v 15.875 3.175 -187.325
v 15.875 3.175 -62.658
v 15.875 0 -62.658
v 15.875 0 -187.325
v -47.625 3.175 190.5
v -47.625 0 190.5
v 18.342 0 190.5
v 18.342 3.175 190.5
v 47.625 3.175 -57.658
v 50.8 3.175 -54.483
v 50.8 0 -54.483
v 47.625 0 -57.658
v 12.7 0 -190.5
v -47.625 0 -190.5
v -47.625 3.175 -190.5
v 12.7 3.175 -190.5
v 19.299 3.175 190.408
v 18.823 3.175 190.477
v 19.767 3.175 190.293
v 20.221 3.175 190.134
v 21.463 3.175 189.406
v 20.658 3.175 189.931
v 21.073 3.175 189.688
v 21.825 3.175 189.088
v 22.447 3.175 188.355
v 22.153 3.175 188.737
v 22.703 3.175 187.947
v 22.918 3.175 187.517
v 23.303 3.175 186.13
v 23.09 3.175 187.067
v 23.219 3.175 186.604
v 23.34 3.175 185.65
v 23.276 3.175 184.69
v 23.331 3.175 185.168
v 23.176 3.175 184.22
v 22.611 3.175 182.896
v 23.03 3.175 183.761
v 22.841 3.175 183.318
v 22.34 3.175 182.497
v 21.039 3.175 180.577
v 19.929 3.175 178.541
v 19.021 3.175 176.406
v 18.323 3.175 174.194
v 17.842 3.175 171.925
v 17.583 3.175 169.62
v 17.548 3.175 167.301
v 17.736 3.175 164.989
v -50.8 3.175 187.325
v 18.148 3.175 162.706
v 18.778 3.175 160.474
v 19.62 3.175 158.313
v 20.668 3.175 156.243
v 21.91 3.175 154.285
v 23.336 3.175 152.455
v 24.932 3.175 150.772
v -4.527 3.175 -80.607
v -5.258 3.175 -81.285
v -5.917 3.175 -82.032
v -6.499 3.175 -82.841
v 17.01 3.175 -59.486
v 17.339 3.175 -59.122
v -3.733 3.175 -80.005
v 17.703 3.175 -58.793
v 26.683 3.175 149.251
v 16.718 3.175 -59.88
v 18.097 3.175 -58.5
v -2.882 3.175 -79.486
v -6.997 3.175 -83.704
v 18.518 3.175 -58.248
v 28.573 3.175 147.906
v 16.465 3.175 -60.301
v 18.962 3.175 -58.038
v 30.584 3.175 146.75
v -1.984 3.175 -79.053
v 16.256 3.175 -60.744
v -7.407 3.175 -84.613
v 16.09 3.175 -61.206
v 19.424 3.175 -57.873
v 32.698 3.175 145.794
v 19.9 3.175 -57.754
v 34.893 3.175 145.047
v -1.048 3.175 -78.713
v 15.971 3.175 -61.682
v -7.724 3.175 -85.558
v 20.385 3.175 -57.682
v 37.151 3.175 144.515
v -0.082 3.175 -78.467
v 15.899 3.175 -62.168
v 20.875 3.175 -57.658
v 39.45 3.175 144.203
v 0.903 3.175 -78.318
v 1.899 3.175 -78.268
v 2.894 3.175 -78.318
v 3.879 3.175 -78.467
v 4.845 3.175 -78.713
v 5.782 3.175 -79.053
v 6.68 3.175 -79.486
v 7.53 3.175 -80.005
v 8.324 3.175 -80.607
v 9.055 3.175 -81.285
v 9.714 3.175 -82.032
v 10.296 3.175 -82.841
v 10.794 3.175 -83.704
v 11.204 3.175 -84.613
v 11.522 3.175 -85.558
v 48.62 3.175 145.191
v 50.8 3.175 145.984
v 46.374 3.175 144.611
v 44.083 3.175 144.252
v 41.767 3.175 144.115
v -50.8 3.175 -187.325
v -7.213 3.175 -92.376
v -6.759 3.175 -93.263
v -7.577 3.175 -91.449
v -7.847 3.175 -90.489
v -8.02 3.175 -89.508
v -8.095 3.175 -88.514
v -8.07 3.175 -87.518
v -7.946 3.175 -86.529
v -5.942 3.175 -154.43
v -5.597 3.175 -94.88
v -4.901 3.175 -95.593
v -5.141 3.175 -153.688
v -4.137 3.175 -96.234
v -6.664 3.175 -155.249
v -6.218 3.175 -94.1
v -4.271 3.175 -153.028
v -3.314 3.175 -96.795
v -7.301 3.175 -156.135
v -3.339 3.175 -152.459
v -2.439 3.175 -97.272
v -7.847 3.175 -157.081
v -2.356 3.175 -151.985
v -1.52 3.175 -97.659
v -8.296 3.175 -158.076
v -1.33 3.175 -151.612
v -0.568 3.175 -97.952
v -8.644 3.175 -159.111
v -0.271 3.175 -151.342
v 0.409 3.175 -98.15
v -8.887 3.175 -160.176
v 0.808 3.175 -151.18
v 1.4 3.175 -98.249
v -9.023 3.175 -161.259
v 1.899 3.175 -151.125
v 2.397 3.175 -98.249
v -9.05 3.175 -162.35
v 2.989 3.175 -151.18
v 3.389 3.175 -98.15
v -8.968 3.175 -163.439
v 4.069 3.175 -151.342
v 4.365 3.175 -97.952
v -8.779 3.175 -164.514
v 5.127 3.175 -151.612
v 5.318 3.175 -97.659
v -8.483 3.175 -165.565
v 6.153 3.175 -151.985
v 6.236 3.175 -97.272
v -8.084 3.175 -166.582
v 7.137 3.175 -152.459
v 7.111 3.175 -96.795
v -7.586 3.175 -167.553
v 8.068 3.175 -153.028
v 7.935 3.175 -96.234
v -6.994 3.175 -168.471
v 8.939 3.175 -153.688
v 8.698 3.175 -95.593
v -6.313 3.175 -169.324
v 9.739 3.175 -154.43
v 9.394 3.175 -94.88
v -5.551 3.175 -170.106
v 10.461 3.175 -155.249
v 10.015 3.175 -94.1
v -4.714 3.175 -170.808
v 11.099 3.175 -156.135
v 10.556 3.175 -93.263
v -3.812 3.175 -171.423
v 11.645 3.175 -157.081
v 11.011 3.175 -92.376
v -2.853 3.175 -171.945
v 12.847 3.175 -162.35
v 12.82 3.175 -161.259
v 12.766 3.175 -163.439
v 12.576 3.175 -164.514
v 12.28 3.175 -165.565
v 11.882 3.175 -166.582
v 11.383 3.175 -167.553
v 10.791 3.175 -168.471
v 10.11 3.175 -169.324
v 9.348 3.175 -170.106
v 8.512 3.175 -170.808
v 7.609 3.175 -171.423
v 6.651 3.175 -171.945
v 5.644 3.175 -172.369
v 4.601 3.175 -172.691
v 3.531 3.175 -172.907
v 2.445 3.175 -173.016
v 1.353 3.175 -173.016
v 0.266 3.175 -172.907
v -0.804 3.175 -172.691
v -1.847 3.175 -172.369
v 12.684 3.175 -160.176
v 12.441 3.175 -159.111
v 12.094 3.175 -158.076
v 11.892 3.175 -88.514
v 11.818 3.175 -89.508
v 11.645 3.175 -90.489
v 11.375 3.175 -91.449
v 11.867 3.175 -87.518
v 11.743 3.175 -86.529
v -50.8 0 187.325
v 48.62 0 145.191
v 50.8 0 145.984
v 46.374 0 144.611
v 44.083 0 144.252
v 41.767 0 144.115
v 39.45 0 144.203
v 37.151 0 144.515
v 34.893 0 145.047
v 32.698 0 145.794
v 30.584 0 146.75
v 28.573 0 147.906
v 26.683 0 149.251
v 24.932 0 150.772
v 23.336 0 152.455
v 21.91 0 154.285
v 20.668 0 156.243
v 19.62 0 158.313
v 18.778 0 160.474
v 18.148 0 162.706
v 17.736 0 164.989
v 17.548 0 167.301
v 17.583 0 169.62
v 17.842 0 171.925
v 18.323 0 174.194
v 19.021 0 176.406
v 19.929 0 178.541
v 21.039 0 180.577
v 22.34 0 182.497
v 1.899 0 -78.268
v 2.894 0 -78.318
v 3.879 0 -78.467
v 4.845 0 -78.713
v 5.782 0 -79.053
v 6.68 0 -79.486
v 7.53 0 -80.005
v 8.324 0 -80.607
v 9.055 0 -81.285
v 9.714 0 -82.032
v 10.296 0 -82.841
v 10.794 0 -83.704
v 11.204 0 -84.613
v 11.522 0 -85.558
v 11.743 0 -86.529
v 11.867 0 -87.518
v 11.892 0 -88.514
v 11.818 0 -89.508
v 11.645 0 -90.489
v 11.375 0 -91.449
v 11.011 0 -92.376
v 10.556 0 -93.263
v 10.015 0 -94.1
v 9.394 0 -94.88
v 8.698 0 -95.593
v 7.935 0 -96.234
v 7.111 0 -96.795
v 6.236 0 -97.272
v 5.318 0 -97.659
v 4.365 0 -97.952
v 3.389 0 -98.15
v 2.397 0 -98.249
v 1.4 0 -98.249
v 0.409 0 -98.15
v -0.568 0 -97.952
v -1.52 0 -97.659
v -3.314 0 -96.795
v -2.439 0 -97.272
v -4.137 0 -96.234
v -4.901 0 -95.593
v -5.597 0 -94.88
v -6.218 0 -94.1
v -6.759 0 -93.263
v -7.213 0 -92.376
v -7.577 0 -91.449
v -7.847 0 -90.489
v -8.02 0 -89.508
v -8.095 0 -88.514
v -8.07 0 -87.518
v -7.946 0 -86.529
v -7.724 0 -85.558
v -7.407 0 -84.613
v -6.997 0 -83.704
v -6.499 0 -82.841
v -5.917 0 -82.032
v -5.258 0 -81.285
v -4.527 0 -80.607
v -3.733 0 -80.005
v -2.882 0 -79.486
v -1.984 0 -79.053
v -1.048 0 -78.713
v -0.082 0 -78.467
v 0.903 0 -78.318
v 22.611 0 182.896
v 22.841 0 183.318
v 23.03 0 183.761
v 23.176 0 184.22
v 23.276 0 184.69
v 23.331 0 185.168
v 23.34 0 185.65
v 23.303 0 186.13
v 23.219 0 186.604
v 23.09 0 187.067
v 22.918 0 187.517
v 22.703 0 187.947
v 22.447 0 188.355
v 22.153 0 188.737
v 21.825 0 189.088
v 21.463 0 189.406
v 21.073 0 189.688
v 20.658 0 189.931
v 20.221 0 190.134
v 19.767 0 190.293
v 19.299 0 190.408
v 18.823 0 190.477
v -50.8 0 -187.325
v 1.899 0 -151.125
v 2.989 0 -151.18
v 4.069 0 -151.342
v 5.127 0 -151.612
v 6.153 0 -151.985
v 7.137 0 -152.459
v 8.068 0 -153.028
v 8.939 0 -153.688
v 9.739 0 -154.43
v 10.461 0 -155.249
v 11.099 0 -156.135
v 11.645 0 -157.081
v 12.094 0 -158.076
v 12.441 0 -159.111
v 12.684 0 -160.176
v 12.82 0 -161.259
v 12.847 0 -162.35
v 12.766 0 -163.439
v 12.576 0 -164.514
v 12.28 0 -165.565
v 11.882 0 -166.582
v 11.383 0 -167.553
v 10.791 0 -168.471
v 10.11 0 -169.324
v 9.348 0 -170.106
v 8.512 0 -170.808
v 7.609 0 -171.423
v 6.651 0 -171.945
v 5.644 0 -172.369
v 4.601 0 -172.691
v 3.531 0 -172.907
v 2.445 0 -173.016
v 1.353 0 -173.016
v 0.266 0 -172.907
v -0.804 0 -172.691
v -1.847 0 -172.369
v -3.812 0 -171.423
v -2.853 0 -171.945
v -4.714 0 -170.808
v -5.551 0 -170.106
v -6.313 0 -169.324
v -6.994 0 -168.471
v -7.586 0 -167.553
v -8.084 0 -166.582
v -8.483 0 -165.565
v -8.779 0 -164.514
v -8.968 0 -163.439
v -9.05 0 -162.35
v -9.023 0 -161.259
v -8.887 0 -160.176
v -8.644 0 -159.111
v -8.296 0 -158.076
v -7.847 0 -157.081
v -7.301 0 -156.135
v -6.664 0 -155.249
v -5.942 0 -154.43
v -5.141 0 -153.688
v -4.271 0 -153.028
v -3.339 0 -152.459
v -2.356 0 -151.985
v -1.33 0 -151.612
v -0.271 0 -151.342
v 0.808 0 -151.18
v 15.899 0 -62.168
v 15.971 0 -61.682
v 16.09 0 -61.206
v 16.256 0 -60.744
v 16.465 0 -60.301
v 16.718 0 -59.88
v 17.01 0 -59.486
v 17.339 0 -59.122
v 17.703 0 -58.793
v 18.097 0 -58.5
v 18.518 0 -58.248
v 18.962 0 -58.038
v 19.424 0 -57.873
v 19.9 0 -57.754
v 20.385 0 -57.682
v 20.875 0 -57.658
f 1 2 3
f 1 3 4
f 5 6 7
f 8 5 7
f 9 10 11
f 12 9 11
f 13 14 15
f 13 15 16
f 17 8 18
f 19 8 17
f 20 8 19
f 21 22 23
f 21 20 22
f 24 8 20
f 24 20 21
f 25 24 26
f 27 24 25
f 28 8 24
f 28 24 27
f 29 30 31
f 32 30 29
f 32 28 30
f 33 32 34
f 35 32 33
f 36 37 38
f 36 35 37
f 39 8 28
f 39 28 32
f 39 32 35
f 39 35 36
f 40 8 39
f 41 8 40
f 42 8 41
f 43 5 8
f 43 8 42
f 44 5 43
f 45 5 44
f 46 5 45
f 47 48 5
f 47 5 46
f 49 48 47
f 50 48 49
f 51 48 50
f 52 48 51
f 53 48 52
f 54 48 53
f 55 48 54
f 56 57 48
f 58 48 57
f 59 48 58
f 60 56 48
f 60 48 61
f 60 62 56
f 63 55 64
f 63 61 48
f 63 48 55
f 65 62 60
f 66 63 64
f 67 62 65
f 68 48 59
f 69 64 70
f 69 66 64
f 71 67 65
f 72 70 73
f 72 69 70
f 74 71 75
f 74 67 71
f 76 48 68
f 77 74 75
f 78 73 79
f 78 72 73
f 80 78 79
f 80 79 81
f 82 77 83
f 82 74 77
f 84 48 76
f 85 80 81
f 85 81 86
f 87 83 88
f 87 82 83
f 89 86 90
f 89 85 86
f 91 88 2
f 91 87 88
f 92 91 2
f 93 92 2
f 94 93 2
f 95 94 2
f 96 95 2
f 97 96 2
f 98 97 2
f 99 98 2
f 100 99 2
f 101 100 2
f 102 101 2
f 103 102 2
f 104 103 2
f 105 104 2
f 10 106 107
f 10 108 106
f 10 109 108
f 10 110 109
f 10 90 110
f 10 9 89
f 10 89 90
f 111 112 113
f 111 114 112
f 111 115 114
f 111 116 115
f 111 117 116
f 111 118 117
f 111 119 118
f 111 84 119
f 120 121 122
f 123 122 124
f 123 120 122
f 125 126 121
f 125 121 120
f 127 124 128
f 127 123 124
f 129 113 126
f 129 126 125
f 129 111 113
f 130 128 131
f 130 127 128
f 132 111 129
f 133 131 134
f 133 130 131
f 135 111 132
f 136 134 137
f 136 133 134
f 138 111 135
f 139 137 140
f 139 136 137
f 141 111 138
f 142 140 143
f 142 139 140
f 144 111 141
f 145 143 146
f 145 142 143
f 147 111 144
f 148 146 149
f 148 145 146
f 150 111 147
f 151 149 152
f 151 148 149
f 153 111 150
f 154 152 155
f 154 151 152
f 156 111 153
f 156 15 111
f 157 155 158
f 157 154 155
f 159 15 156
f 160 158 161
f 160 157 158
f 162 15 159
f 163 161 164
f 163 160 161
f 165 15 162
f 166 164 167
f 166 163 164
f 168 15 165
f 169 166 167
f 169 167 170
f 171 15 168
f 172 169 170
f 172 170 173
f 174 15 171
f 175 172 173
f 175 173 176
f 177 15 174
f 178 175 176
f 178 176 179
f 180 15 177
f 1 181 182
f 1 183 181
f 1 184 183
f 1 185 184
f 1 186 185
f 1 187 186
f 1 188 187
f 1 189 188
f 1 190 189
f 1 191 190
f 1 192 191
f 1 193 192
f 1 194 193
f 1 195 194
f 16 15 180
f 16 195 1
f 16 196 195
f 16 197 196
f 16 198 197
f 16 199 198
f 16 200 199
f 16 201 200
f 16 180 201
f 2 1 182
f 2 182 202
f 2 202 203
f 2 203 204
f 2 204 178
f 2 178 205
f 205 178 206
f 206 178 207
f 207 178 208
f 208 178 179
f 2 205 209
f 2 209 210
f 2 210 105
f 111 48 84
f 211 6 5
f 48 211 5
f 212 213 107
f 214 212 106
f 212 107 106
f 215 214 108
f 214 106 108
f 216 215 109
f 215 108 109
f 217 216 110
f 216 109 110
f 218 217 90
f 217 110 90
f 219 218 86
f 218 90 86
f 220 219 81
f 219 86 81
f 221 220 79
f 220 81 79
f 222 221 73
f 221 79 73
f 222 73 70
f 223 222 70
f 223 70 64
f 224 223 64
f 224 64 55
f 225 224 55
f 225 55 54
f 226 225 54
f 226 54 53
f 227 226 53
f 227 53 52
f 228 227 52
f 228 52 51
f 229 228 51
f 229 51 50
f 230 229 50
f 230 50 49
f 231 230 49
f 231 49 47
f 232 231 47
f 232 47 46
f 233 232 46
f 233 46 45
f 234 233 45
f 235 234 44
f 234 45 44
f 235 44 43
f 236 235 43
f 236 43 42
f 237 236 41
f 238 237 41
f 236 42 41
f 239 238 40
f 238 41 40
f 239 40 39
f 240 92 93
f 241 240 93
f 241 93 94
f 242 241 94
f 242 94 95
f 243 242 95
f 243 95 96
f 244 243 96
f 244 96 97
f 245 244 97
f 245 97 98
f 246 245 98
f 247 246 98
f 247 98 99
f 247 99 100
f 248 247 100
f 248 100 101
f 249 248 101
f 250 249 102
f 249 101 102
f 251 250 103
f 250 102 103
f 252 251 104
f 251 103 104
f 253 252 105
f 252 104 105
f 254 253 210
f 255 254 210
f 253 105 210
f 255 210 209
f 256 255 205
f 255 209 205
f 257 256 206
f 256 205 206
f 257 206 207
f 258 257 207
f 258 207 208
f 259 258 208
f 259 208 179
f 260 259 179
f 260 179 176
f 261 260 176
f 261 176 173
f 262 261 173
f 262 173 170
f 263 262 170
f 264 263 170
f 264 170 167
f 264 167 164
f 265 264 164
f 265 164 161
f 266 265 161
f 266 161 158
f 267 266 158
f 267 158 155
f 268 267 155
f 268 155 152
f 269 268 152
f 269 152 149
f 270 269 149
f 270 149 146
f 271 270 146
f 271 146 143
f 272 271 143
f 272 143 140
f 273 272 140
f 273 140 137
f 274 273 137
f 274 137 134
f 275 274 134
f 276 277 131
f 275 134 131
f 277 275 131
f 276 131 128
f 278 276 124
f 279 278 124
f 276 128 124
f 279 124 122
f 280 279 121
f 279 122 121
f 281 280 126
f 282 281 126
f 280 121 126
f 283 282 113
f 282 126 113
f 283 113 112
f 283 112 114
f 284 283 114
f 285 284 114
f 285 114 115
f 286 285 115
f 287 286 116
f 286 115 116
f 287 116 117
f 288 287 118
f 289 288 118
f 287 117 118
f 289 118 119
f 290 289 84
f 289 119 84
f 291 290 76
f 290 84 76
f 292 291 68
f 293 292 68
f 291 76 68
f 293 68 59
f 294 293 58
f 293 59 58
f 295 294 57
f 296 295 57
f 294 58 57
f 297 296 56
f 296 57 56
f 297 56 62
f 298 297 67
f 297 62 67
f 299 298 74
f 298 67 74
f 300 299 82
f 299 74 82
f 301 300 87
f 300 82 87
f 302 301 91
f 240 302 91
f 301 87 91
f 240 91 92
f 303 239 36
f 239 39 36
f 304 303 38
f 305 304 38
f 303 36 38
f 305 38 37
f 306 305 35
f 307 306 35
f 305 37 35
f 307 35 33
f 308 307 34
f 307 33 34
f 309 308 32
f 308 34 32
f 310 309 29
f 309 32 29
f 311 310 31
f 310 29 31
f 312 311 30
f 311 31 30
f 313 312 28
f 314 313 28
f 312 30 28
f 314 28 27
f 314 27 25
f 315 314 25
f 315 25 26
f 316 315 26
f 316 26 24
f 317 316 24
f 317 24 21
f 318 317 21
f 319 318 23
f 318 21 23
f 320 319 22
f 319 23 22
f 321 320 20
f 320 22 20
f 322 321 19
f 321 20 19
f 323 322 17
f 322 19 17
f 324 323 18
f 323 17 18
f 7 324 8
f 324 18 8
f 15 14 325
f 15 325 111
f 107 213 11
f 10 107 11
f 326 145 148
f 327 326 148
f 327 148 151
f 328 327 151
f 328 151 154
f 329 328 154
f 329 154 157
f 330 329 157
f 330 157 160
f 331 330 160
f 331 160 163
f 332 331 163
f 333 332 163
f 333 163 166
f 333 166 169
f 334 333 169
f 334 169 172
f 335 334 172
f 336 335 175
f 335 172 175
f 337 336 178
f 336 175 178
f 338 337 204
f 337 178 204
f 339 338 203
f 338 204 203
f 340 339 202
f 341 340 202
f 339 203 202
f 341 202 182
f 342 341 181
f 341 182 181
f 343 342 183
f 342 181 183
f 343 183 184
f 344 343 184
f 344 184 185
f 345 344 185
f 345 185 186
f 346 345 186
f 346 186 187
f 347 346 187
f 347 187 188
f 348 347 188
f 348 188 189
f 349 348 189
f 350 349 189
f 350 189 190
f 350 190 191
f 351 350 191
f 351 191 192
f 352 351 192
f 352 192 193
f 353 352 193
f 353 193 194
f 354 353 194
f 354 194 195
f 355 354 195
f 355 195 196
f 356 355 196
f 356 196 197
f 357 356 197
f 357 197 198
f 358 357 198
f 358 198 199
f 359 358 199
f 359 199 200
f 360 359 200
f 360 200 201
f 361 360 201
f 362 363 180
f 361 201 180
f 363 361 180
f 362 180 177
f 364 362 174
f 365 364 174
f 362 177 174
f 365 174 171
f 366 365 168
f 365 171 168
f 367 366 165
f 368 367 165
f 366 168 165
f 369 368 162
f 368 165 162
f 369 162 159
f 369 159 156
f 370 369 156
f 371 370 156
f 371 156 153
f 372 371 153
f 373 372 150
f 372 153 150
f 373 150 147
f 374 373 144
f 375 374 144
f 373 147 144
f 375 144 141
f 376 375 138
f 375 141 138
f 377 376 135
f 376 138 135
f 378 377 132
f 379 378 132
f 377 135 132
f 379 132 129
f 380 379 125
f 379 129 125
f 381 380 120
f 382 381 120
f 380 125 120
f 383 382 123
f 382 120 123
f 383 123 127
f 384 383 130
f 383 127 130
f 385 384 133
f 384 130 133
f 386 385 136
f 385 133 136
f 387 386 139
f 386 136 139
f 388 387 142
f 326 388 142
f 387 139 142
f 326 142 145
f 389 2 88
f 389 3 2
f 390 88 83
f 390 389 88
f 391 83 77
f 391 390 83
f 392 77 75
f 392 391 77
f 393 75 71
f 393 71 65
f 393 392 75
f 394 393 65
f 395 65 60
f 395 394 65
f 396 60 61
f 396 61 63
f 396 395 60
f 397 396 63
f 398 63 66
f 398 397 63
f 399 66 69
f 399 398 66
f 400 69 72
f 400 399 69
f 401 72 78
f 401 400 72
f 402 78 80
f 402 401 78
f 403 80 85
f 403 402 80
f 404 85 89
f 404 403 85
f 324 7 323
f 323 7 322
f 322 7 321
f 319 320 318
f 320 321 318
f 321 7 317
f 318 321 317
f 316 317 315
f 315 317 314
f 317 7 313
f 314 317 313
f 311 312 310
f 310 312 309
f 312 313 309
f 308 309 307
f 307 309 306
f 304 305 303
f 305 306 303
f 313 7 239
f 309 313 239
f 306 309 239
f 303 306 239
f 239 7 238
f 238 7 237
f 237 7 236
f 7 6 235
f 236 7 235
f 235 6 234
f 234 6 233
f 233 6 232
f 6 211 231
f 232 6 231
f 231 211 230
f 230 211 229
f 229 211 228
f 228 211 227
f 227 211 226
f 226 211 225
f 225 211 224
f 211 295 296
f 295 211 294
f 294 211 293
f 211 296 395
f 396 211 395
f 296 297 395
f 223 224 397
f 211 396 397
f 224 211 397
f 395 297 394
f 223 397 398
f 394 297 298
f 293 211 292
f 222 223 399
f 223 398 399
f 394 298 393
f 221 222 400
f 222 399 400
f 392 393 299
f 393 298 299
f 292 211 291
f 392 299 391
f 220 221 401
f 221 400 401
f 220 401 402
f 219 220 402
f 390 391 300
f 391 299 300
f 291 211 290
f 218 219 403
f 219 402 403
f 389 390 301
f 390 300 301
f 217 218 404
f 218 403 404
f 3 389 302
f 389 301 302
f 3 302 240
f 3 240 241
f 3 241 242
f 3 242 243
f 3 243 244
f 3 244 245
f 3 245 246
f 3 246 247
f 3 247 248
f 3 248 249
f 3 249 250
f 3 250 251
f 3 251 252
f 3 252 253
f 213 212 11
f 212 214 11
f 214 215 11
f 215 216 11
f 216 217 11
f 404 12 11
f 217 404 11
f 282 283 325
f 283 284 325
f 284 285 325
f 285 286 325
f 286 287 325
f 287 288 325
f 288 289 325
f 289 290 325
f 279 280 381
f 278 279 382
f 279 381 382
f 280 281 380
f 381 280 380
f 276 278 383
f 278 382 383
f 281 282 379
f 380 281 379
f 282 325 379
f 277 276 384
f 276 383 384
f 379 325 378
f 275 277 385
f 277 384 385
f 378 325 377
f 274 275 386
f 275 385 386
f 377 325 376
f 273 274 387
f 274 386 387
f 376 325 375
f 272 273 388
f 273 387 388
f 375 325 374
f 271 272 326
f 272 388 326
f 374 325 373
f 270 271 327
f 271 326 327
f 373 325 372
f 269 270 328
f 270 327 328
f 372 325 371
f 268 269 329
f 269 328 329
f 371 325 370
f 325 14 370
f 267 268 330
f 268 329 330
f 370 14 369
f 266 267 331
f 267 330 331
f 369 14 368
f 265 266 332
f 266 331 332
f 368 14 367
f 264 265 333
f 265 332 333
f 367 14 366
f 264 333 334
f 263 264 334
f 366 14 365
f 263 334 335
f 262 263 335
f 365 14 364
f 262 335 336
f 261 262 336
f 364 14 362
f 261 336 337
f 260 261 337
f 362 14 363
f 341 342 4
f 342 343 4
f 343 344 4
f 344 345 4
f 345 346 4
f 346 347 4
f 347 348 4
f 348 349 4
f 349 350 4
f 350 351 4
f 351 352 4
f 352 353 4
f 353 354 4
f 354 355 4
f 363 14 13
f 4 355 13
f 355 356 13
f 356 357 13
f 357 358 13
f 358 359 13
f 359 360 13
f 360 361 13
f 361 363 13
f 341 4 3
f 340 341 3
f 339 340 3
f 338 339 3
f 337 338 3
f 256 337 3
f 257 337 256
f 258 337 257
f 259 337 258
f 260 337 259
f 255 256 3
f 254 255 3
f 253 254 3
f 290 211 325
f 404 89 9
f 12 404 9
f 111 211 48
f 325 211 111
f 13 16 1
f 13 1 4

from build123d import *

# Parameters (mm, degrees)
SKETCH1_W           = 101.6
SKETCH1_H           = 381
BOSS_EXTRUDE1_DEPTH = 3.175
CHAMFER1_SIZE       = 3.175
CUT_EXTRUDE1_REACH  = 199.183
SKETCH2_R           = 23.981466634
SKETCH2_R_2         = 10.952088468
SKETCH2_R_3         = 9.996566117
SKETCH2_W           = 34.925
SKETCH2_H           = 132.842153018
CHAMFER2_SIZE       = 3.175
FILLET1_R           = 5
FILLET2_R           = 5


with BuildPart() as part:
    # Sketch1 → Boss-Extrude1 (new body)
    with BuildSketch(Plane(origin=(0, 0, 0), x_dir=(1, 0, 0), z_dir=(0, 1, 0))):
        Rectangle(SKETCH1_W, SKETCH1_H)
    extrude(amount=BOSS_EXTRUDE1_DEPTH)

    # Chamfer1
    chamfer1_edges = [part.edges().sort_by_distance(p)[0] for p in [
        (-50.8, 1.5875, -190.5),
        (50.8, 1.5875, -190.5),
        (50.8, 1.5875, 190.5),
        (-50.8, 1.5875, 190.5),
    ]]
    chamfer(chamfer1_edges, length=CHAMFER1_SIZE)

    # Sketch2 → Cut-Extrude1 (cut, up to next)
    with BuildSketch(Plane(origin=(0, 3.175, 0), x_dir=(1, 0, 0), z_dir=(0, 1, 0)), mode=Mode.PRIVATE) as cut_extrude1_sk1:
        with Locations((41.515832085, -168.095479014)):
            Circle(SKETCH2_R)
    cut_extrude1_tool1 = extrude(cut_extrude1_sk1.sketch, amount=-CUT_EXTRUDE1_REACH, mode=Mode.PRIVATE) & part.part
    # Sketch2 → Cut-Extrude1 (cut, up to next)
    with BuildSketch(Plane(origin=(0, 3.175, 0), x_dir=(1, 0, 0), z_dir=(0, 1, 0)), mode=Mode.PRIVATE) as cut_extrude1_sk2:
        with Locations((1.89865, 162.0774)):
            Circle(SKETCH2_R_2)
    cut_extrude1_tool2 = extrude(cut_extrude1_sk2.sketch, amount=-CUT_EXTRUDE1_REACH, mode=Mode.PRIVATE) & part.part
    # Sketch2 → Cut-Extrude1 (cut, up to next)
    with BuildSketch(Plane(origin=(0, 3.175, 0), x_dir=(1, 0, 0), z_dir=(0, 1, 0)), mode=Mode.PRIVATE) as cut_extrude1_sk3:
        with Locations((1.89865, 88.265)):
            Circle(SKETCH2_R_3)
    cut_extrude1_tool3 = extrude(cut_extrude1_sk3.sketch, amount=-CUT_EXTRUDE1_REACH, mode=Mode.PRIVATE) & part.part
    # Sketch2 → Cut-Extrude1 (cut, up to next)
    with BuildSketch(Plane(origin=(0, 3.175, 0), x_dir=(1, 0, 0), z_dir=(0, 1, 0)), mode=Mode.PRIVATE) as cut_extrude1_sk4:
        with Locations((33.3375, 124.078923491)):
            Rectangle(SKETCH2_W, SKETCH2_H)
    cut_extrude1_tool4 = extrude(cut_extrude1_sk4.sketch, amount=-CUT_EXTRUDE1_REACH, mode=Mode.PRIVATE) & part.part
    add(cut_extrude1_tool1.solids().sort_by_distance((41.515832, 3.175, 168.095479))[0], mode=Mode.SUBTRACT)
    add(cut_extrude1_tool2.solids().sort_by_distance((1.89865, 3.175, -162.0774))[0], mode=Mode.SUBTRACT)
    add(cut_extrude1_tool3.solids().sort_by_distance((1.89865, 3.175, -88.265))[0], mode=Mode.SUBTRACT)
    add(cut_extrude1_tool4.solids().sort_by_distance((33.3375, 3.175, -124.078923))[0], mode=Mode.SUBTRACT)

    # Chamfer2
    chamfer2_edges = [part.edges().sort_by_distance(p)[0] for p in [
        (50.8, 1.5875, -57.657846982),
        (15.875, 1.5875, -190.5),
    ]]
    chamfer(chamfer2_edges, length=CHAMFER2_SIZE)

    # Fillet1
    fillet1_edges = [part.edges().sort_by_distance(p)[0] for p in [
        (15.875, 1.5875, -57.657846982),
    ]]
    fillet(fillet1_edges, radius=FILLET1_R)

    # Fillet2
    fillet2_edges = [part.edges().sort_by_distance(p)[0] for p in [
        (32.963161081, 1.5875, 190.5),
    ]]
    fillet(fillet2_edges, radius=FILLET2_R)


solid = part.part
